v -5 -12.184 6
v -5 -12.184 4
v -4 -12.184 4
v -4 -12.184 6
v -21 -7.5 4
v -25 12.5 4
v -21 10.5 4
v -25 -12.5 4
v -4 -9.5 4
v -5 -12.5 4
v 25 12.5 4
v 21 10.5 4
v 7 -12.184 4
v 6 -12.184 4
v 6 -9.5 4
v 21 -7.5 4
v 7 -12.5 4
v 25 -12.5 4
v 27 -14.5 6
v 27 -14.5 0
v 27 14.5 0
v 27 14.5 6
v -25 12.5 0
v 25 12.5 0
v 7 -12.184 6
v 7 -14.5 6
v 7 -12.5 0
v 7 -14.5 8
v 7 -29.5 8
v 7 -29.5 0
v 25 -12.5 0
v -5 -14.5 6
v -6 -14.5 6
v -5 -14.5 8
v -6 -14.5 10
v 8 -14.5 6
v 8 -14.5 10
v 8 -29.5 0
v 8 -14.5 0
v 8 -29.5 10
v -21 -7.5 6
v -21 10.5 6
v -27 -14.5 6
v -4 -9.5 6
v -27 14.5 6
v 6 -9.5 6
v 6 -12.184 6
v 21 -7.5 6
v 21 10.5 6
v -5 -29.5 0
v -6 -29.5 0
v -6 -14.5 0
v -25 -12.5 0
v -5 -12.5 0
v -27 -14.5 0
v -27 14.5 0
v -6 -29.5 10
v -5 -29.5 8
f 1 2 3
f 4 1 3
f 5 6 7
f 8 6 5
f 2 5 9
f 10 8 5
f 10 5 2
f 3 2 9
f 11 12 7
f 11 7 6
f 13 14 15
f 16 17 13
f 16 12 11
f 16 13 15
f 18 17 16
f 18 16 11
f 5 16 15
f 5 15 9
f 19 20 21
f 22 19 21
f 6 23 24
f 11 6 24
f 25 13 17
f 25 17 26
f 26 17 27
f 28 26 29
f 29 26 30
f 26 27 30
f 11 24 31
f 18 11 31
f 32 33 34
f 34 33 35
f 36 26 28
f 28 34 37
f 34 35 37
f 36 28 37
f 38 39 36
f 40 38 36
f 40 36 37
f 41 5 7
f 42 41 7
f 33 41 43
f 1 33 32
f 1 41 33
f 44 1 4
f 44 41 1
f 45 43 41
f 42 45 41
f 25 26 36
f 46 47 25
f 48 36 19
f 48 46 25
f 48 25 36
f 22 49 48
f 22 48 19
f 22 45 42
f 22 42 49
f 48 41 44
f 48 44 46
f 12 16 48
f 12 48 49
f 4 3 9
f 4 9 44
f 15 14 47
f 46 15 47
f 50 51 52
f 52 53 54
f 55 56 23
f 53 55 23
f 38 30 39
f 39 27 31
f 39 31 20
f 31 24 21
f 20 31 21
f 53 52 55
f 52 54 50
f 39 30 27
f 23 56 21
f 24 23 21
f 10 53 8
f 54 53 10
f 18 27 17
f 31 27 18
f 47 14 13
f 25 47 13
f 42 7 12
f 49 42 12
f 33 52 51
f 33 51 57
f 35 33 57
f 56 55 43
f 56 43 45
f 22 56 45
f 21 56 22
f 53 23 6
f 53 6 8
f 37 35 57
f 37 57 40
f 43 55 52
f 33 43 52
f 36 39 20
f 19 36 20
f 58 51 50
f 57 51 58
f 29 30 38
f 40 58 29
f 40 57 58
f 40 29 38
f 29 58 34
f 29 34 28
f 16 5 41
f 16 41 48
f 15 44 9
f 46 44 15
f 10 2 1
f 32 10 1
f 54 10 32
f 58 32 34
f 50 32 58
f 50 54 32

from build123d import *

# Parameters (mm, degrees)
F0_W      = 54
F0_H      = 29
F2_DEPTH  = 6
F1_W      = 42
F1_H      = 18
F3_DEPTH  = 25.4
F4_W      = 50
F4_H      = 25
F5_DEPTH  = 4
F6_W      = 10
F6_H      = 6
F7_DEPTH  = 5
F8_W      = 14
F8_H      = 10
F9_DEPTH  = 15
F10_W     = 12
F10_H     = 18.710866
F11_DEPTH = 8


with BuildPart() as f2:
    # F0 (on Top) → F2 (new body)
    with BuildSketch(Plane.XY):
        Rectangle(F0_W, F0_H)
    extrude(amount=F2_DEPTH)

    # F1 (on face) → F3 (cut)
    with BuildSketch(Plane.XY):
        with Locations((0, 1.5)):
            Rectangle(F1_W, F1_H)
    extrude(amount=F3_DEPTH, mode=Mode.SUBTRACT)

    # F4 (on face) → F5 (cut)
    with BuildSketch(Plane(origin=(0, 0, 0), x_dir=(1, 0, 0), z_dir=(0, 0, -1))):
        Rectangle(F4_W, F4_H)
    extrude(amount=-F5_DEPTH, mode=Mode.SUBTRACT)

    # F6 (on face) → F7 (cut)
    with BuildSketch(Plane.XZ.offset(14.5)):
        with Locations((1, 3)):
            Rectangle(F6_W, F6_H)
    extrude(amount=-F7_DEPTH, mode=Mode.SUBTRACT)

    # F8 (on face) → F9 (join)
    with BuildSketch(Plane.XZ.offset(14.5)):
        with Locations((1, 5)):
            Rectangle(F8_W, F8_H)
    extrude(amount=F9_DEPTH)

    # F10 (on face) → F11 (cut)
    with BuildSketch(Plane(origin=(0, 0, 0), x_dir=(1, 0, 0), z_dir=(0, 0, -1))):
        with Locations((1, 21.539463)):
            Rectangle(F10_W, F10_H)
    extrude(amount=-F11_DEPTH, mode=Mode.SUBTRACT)


solid = f2.part
